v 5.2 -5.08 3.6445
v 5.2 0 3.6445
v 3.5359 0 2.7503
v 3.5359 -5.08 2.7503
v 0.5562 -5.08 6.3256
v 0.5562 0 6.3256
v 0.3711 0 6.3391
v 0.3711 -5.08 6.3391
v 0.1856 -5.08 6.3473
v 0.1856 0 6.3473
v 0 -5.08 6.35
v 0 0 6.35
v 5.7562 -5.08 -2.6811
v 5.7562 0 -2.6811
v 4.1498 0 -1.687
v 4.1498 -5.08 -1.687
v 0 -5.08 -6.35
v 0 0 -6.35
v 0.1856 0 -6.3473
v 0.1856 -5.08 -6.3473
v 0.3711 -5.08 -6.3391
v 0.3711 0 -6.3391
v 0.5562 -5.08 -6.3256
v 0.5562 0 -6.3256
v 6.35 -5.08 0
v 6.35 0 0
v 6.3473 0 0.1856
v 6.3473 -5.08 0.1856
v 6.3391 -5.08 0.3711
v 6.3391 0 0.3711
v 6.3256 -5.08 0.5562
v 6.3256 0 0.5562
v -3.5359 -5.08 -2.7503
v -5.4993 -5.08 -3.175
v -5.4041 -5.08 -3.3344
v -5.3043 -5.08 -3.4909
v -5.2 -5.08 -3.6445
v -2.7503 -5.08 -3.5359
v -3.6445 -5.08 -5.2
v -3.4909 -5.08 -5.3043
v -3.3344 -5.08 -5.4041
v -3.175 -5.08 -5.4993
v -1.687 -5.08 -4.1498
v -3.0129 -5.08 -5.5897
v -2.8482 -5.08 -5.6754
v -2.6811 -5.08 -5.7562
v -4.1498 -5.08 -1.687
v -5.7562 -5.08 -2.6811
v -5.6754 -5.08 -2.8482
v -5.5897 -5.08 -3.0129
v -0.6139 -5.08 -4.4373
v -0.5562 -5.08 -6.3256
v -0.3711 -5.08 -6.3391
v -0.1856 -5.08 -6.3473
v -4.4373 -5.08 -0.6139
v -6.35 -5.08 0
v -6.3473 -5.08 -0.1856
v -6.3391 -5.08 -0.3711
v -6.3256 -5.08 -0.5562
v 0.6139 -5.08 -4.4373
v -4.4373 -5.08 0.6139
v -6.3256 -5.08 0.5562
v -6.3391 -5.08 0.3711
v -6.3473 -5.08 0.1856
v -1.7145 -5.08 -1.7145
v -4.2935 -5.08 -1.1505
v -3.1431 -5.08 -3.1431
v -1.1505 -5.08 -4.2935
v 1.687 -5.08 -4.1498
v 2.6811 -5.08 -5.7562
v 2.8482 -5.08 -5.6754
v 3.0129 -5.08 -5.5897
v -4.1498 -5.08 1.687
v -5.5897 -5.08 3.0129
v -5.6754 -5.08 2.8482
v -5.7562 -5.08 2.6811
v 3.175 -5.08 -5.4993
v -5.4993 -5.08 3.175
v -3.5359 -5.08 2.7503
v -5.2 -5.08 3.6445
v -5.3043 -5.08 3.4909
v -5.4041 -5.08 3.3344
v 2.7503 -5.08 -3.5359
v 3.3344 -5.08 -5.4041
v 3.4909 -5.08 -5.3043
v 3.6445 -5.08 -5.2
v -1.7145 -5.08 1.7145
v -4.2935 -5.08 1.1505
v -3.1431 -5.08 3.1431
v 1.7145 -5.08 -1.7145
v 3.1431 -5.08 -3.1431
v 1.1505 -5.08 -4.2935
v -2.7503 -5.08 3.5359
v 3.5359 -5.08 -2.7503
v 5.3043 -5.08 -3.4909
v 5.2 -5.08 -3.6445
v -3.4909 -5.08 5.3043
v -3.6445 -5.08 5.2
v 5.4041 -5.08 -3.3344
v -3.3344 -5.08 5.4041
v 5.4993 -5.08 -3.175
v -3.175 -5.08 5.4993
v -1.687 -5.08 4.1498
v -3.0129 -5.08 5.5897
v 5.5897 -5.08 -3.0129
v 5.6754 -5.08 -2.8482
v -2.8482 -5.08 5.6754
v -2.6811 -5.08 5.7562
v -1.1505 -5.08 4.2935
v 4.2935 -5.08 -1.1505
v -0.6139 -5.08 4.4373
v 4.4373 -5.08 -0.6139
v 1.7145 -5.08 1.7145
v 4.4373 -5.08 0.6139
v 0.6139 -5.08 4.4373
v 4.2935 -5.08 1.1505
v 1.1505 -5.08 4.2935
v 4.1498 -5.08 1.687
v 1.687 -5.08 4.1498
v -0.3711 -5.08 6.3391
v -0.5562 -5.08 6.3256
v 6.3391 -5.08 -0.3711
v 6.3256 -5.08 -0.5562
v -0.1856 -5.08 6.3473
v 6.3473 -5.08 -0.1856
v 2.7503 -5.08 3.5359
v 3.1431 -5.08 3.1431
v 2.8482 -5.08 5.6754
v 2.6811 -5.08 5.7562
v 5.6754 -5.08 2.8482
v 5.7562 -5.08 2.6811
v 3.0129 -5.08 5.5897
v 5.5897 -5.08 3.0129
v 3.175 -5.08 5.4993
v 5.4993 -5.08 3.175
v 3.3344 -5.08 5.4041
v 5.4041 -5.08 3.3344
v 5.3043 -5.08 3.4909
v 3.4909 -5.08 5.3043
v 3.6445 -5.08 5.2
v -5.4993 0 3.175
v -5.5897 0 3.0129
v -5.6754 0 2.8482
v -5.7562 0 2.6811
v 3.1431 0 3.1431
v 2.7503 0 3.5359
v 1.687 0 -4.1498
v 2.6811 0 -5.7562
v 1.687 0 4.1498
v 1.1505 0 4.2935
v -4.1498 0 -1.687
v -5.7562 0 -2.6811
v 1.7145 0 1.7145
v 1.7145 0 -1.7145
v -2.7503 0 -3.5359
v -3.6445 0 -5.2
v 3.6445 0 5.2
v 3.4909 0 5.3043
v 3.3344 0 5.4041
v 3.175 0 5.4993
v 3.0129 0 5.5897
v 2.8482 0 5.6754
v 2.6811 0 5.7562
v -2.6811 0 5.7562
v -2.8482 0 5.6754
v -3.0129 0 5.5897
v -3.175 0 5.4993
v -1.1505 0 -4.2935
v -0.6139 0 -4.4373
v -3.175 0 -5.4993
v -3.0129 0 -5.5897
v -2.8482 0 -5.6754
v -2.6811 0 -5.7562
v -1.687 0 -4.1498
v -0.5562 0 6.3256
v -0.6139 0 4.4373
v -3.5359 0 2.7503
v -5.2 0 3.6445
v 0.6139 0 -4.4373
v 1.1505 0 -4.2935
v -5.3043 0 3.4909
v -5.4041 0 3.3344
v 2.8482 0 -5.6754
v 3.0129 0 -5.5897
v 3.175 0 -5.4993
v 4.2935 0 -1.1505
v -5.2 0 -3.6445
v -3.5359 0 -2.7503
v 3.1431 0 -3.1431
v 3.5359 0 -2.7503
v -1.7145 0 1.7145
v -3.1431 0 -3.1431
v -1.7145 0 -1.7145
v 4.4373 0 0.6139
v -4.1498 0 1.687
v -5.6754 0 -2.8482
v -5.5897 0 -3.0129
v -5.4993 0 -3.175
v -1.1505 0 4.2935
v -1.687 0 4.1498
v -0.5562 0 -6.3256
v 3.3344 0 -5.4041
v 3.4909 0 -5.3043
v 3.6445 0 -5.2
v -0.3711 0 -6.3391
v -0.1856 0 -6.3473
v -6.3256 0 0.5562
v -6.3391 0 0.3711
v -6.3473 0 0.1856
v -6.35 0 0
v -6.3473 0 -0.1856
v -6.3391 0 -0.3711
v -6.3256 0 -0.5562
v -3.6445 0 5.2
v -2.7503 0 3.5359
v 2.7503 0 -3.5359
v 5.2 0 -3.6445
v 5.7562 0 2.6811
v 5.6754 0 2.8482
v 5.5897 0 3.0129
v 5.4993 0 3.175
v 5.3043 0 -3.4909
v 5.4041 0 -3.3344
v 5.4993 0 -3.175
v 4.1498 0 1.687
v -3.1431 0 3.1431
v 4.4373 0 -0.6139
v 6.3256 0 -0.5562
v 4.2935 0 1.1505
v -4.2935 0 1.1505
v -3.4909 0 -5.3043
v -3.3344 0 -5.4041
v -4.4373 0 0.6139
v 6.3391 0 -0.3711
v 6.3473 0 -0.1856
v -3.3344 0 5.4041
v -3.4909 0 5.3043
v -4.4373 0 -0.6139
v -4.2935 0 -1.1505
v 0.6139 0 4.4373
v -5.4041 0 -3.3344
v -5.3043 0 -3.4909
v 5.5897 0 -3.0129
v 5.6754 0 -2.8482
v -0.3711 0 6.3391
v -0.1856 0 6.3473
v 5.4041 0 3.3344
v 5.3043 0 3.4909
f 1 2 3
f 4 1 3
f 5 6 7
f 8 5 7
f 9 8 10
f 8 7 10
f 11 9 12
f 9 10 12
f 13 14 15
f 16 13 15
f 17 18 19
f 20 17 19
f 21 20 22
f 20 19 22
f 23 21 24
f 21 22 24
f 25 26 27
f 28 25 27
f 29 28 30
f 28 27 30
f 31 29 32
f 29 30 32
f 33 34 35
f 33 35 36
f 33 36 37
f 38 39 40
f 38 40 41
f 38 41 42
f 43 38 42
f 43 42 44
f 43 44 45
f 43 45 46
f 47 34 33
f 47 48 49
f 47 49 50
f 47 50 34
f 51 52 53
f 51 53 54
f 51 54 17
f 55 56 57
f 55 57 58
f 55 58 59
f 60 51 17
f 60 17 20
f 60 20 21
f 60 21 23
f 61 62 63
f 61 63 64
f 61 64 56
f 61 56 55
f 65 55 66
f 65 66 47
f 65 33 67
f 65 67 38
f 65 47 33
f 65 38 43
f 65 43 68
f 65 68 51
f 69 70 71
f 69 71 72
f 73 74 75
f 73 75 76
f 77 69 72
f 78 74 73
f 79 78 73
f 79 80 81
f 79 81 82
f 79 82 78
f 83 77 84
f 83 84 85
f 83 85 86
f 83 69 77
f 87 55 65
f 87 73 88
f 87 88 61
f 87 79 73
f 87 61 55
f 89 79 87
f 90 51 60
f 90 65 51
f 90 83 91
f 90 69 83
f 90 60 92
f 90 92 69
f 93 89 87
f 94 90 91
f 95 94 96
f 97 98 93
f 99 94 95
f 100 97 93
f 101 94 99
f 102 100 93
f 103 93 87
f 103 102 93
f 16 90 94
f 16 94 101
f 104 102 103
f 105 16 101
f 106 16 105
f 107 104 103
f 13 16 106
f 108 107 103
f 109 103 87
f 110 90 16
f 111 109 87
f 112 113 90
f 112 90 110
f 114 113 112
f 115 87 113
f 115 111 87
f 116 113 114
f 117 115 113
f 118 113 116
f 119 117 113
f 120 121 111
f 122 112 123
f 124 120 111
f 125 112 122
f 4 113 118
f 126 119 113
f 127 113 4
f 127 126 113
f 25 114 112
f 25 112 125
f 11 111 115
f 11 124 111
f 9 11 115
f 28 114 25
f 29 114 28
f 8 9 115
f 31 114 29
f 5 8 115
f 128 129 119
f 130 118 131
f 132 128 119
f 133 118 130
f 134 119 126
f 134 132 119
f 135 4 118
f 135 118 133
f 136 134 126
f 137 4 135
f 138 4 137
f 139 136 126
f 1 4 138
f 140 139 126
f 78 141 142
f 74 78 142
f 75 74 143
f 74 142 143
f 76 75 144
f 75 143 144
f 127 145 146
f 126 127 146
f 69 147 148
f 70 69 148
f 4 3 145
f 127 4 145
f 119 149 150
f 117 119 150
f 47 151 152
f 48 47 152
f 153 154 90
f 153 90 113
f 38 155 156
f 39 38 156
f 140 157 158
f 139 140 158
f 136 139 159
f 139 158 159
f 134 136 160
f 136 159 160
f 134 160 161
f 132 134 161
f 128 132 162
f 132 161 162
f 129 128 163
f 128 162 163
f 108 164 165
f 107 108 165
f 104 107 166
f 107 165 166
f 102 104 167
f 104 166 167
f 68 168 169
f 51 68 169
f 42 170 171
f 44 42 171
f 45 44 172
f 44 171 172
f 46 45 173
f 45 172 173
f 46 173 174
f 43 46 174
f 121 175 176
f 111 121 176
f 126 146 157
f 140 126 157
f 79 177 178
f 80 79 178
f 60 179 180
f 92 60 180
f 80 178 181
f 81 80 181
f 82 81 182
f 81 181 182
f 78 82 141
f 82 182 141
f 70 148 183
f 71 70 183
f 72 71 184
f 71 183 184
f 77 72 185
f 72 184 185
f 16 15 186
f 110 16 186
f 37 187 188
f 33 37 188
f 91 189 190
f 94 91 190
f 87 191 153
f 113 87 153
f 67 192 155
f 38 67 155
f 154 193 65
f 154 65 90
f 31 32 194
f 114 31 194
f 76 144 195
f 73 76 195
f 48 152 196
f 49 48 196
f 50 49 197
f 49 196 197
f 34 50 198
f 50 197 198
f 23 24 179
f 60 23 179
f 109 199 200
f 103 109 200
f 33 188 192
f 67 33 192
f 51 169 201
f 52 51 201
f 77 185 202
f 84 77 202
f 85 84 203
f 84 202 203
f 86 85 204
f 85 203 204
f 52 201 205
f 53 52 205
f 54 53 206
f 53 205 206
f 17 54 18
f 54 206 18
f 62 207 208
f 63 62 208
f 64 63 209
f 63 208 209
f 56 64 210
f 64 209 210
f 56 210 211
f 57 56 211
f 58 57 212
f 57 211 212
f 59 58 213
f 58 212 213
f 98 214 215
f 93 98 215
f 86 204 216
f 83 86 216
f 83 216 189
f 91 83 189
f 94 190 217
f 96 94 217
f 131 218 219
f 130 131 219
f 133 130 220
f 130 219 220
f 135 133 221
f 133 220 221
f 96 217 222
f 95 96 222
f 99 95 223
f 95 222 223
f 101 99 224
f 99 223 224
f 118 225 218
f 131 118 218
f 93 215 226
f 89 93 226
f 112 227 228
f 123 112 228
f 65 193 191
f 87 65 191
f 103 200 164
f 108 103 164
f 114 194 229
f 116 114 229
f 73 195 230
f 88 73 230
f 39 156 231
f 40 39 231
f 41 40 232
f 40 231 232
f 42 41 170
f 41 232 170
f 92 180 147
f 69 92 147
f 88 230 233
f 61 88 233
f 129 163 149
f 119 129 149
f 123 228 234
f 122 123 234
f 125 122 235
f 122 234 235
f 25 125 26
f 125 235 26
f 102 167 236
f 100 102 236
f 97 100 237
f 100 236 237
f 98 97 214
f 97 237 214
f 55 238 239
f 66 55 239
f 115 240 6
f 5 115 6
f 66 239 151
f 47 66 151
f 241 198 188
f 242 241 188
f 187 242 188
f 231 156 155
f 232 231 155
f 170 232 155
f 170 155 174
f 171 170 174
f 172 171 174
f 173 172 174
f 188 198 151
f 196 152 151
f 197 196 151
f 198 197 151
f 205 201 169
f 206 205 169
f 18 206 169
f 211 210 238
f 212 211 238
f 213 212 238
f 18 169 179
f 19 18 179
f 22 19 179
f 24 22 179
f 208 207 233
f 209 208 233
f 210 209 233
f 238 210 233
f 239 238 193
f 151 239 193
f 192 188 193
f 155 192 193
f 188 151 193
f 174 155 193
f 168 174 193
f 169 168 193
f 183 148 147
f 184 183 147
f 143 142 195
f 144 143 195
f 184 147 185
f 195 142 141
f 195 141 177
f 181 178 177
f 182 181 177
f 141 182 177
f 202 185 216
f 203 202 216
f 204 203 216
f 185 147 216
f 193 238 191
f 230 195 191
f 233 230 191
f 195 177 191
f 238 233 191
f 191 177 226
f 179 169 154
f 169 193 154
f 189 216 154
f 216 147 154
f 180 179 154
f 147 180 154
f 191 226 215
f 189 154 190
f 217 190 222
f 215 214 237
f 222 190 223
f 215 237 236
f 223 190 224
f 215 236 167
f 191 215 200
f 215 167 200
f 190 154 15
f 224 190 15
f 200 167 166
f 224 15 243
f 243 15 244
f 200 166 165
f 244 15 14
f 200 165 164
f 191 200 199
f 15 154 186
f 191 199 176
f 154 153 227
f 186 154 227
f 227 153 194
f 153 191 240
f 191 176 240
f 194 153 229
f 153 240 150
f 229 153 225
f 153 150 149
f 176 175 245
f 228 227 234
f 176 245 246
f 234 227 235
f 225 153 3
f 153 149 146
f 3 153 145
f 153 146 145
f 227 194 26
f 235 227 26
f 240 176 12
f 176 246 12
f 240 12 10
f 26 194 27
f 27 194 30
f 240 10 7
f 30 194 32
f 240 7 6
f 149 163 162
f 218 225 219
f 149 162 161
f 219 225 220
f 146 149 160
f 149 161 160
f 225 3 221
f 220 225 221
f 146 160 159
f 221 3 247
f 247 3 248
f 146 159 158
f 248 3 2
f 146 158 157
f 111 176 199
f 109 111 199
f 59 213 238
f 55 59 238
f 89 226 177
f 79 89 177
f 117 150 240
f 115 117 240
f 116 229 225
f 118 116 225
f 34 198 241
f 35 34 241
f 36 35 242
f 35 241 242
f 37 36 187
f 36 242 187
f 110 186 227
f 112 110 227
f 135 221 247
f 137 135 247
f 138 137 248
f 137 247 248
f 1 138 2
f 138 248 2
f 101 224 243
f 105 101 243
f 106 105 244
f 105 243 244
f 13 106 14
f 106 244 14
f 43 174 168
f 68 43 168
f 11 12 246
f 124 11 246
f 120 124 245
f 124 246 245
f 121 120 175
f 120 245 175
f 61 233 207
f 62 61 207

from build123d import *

# Parameters (mm, degrees)
F0_W     = 3.429
F0_H     = 3.429
F1_DEPTH = 5.08


with BuildPart() as f1:
    # F0 (on Front) → F1 (new body)
    with BuildSketch(Plane.XZ):
        with BuildLine():
            ThreePointArc((6.325593, -0.556216), (6.343895, -0.278375), (6.35, 0))
            ThreePointArc((6.35, 0), (6.343895, 0.278375), (6.325593, 0.556216))
            Line((6.325593, 0.556216), (4.437306, 0.613908))
            Line((4.437306, 0.613908), (4.29354, 1.150451))
            Line((4.29354, 1.150451), (4.149774, 1.686993))
            Line((4.149774, 1.686993), (5.756232, 2.6811))
            ThreePointArc((5.756232, 2.6811), (5.633162, 2.930867), (5.499261, 3.175))
            ThreePointArc((5.499261, 3.175), (5.354787, 3.413028), (5.200016, 3.644493))
            Line((5.200016, 3.644493), (3.535866, 2.750313))
            Line((3.535866, 2.750313), (3.14309, 3.14309))
            Line((3.14309, 3.14309), (2.750313, 3.535866))
            Line((2.750313, 3.535866), (3.644493, 5.200016))
            ThreePointArc((3.644493, 5.200016), (3.413028, 5.354787), (3.175, 5.499261))
            ThreePointArc((3.175, 5.499261), (2.930867, 5.633162), (2.6811, 5.756232))
            Line((2.6811, 5.756232), (1.686993, 4.149774))
            Line((1.686993, 4.149774), (1.150451, 4.29354))
            Line((1.150451, 4.29354), (0.613908, 4.437306))
            Line((0.613908, 4.437306), (0.556216, 6.325593))
            ThreePointArc((0.556216, 6.325593), (0.278375, 6.343895), (0, 6.35))
            ThreePointArc((0, 6.35), (-0.278375, 6.343895), (-0.556216, 6.325593))
            Line((-0.556216, 6.325593), (-0.613908, 4.437306))
            Line((-0.613908, 4.437306), (-1.150451, 4.29354))
            Line((-1.150451, 4.29354), (-1.686993, 4.149774))
            Line((-1.686993, 4.149774), (-2.6811, 5.756232))
            ThreePointArc((-2.6811, 5.756232), (-2.930867, 5.633162), (-3.175, 5.499261))
            ThreePointArc((-3.175, 5.499261), (-3.413028, 5.354787), (-3.644493, 5.200016))
            Line((-3.644493, 5.200016), (-2.750313, 3.535866))
            Line((-2.750313, 3.535866), (-3.14309, 3.14309))
            Line((-3.14309, 3.14309), (-3.535866, 2.750313))
            Line((-3.535866, 2.750313), (-5.200016, 3.644493))
            ThreePointArc((-5.200016, 3.644493), (-5.354787, 3.413028), (-5.499261, 3.175))
            ThreePointArc((-5.499261, 3.175), (-5.633162, 2.930867), (-5.756232, 2.6811))
            Line((-5.756232, 2.6811), (-4.149774, 1.686993))
            Line((-4.149774, 1.686993), (-4.29354, 1.150451))
            Line((-4.29354, 1.150451), (-4.437306, 0.613908))
            Line((-4.437306, 0.613908), (-6.325593, 0.556216))
            ThreePointArc((-6.325593, 0.556216), (-6.343895, 0.278375), (-6.35, 0))
            ThreePointArc((-6.35, 0), (-6.343895, -0.278375), (-6.325593, -0.556216))
            Line((-6.325593, -0.556216), (-4.437306, -0.613908))
            Line((-4.437306, -0.613908), (-4.29354, -1.150451))
            Line((-4.29354, -1.150451), (-4.149774, -1.686993))
            Line((-4.149774, -1.686993), (-5.756232, -2.6811))
            ThreePointArc((-5.756232, -2.6811), (-5.633162, -2.930867), (-5.499261, -3.175))
            ThreePointArc((-5.499261, -3.175), (-5.354787, -3.413028), (-5.200016, -3.644493))
            Line((-5.200016, -3.644493), (-3.535866, -2.750313))
            Line((-3.535866, -2.750313), (-3.14309, -3.14309))
            Line((-3.14309, -3.14309), (-2.750313, -3.535866))
            Line((-2.750313, -3.535866), (-3.644493, -5.200016))
            ThreePointArc((-3.644493, -5.200016), (-3.413028, -5.354787), (-3.175, -5.499261))
            ThreePointArc((-3.175, -5.499261), (-2.930867, -5.633162), (-2.6811, -5.756232))
            Line((-2.6811, -5.756232), (-1.686993, -4.149774))
            Line((-1.686993, -4.149774), (-1.150451, -4.29354))
            Line((-1.150451, -4.29354), (-0.613908, -4.437306))
            Line((-0.613908, -4.437306), (-0.556216, -6.325593))
            ThreePointArc((-0.556216, -6.325593), (-0.278375, -6.343895), (0, -6.35))
            ThreePointArc((0, -6.35), (0.278375, -6.343895), (0.556216, -6.325593))
            Line((0.556216, -6.325593), (0.613908, -4.437306))
            Line((0.613908, -4.437306), (1.150451, -4.29354))
            Line((1.150451, -4.29354), (1.686993, -4.149774))
            Line((1.686993, -4.149774), (2.6811, -5.756232))
            ThreePointArc((2.6811, -5.756232), (2.930867, -5.633162), (3.175, -5.499261))
            ThreePointArc((3.175, -5.499261), (3.413028, -5.354787), (3.644493, -5.200016))
            Line((3.644493, -5.200016), (2.750313, -3.535866))
            Line((2.750313, -3.535866), (3.14309, -3.14309))
            Line((3.14309, -3.14309), (3.535866, -2.750313))
            Line((3.535866, -2.750313), (5.200016, -3.644493))
            ThreePointArc((5.200016, -3.644493), (5.354787, -3.413028), (5.499261, -3.175))
            ThreePointArc((5.499261, -3.175), (5.633162, -2.930867), (5.756232, -2.6811))
            Line((5.756232, -2.6811), (4.149774, -1.686993))
            Line((4.149774, -1.686993), (4.29354, -1.150451))
            Line((4.29354, -1.150451), (4.437306, -0.613908))
            Line((4.437306, -0.613908), (6.325593, -0.556216))
        make_face()
        Rectangle(F0_W, F0_H, mode=Mode.SUBTRACT)
    extrude(amount=F1_DEPTH)


solid = f1.part
